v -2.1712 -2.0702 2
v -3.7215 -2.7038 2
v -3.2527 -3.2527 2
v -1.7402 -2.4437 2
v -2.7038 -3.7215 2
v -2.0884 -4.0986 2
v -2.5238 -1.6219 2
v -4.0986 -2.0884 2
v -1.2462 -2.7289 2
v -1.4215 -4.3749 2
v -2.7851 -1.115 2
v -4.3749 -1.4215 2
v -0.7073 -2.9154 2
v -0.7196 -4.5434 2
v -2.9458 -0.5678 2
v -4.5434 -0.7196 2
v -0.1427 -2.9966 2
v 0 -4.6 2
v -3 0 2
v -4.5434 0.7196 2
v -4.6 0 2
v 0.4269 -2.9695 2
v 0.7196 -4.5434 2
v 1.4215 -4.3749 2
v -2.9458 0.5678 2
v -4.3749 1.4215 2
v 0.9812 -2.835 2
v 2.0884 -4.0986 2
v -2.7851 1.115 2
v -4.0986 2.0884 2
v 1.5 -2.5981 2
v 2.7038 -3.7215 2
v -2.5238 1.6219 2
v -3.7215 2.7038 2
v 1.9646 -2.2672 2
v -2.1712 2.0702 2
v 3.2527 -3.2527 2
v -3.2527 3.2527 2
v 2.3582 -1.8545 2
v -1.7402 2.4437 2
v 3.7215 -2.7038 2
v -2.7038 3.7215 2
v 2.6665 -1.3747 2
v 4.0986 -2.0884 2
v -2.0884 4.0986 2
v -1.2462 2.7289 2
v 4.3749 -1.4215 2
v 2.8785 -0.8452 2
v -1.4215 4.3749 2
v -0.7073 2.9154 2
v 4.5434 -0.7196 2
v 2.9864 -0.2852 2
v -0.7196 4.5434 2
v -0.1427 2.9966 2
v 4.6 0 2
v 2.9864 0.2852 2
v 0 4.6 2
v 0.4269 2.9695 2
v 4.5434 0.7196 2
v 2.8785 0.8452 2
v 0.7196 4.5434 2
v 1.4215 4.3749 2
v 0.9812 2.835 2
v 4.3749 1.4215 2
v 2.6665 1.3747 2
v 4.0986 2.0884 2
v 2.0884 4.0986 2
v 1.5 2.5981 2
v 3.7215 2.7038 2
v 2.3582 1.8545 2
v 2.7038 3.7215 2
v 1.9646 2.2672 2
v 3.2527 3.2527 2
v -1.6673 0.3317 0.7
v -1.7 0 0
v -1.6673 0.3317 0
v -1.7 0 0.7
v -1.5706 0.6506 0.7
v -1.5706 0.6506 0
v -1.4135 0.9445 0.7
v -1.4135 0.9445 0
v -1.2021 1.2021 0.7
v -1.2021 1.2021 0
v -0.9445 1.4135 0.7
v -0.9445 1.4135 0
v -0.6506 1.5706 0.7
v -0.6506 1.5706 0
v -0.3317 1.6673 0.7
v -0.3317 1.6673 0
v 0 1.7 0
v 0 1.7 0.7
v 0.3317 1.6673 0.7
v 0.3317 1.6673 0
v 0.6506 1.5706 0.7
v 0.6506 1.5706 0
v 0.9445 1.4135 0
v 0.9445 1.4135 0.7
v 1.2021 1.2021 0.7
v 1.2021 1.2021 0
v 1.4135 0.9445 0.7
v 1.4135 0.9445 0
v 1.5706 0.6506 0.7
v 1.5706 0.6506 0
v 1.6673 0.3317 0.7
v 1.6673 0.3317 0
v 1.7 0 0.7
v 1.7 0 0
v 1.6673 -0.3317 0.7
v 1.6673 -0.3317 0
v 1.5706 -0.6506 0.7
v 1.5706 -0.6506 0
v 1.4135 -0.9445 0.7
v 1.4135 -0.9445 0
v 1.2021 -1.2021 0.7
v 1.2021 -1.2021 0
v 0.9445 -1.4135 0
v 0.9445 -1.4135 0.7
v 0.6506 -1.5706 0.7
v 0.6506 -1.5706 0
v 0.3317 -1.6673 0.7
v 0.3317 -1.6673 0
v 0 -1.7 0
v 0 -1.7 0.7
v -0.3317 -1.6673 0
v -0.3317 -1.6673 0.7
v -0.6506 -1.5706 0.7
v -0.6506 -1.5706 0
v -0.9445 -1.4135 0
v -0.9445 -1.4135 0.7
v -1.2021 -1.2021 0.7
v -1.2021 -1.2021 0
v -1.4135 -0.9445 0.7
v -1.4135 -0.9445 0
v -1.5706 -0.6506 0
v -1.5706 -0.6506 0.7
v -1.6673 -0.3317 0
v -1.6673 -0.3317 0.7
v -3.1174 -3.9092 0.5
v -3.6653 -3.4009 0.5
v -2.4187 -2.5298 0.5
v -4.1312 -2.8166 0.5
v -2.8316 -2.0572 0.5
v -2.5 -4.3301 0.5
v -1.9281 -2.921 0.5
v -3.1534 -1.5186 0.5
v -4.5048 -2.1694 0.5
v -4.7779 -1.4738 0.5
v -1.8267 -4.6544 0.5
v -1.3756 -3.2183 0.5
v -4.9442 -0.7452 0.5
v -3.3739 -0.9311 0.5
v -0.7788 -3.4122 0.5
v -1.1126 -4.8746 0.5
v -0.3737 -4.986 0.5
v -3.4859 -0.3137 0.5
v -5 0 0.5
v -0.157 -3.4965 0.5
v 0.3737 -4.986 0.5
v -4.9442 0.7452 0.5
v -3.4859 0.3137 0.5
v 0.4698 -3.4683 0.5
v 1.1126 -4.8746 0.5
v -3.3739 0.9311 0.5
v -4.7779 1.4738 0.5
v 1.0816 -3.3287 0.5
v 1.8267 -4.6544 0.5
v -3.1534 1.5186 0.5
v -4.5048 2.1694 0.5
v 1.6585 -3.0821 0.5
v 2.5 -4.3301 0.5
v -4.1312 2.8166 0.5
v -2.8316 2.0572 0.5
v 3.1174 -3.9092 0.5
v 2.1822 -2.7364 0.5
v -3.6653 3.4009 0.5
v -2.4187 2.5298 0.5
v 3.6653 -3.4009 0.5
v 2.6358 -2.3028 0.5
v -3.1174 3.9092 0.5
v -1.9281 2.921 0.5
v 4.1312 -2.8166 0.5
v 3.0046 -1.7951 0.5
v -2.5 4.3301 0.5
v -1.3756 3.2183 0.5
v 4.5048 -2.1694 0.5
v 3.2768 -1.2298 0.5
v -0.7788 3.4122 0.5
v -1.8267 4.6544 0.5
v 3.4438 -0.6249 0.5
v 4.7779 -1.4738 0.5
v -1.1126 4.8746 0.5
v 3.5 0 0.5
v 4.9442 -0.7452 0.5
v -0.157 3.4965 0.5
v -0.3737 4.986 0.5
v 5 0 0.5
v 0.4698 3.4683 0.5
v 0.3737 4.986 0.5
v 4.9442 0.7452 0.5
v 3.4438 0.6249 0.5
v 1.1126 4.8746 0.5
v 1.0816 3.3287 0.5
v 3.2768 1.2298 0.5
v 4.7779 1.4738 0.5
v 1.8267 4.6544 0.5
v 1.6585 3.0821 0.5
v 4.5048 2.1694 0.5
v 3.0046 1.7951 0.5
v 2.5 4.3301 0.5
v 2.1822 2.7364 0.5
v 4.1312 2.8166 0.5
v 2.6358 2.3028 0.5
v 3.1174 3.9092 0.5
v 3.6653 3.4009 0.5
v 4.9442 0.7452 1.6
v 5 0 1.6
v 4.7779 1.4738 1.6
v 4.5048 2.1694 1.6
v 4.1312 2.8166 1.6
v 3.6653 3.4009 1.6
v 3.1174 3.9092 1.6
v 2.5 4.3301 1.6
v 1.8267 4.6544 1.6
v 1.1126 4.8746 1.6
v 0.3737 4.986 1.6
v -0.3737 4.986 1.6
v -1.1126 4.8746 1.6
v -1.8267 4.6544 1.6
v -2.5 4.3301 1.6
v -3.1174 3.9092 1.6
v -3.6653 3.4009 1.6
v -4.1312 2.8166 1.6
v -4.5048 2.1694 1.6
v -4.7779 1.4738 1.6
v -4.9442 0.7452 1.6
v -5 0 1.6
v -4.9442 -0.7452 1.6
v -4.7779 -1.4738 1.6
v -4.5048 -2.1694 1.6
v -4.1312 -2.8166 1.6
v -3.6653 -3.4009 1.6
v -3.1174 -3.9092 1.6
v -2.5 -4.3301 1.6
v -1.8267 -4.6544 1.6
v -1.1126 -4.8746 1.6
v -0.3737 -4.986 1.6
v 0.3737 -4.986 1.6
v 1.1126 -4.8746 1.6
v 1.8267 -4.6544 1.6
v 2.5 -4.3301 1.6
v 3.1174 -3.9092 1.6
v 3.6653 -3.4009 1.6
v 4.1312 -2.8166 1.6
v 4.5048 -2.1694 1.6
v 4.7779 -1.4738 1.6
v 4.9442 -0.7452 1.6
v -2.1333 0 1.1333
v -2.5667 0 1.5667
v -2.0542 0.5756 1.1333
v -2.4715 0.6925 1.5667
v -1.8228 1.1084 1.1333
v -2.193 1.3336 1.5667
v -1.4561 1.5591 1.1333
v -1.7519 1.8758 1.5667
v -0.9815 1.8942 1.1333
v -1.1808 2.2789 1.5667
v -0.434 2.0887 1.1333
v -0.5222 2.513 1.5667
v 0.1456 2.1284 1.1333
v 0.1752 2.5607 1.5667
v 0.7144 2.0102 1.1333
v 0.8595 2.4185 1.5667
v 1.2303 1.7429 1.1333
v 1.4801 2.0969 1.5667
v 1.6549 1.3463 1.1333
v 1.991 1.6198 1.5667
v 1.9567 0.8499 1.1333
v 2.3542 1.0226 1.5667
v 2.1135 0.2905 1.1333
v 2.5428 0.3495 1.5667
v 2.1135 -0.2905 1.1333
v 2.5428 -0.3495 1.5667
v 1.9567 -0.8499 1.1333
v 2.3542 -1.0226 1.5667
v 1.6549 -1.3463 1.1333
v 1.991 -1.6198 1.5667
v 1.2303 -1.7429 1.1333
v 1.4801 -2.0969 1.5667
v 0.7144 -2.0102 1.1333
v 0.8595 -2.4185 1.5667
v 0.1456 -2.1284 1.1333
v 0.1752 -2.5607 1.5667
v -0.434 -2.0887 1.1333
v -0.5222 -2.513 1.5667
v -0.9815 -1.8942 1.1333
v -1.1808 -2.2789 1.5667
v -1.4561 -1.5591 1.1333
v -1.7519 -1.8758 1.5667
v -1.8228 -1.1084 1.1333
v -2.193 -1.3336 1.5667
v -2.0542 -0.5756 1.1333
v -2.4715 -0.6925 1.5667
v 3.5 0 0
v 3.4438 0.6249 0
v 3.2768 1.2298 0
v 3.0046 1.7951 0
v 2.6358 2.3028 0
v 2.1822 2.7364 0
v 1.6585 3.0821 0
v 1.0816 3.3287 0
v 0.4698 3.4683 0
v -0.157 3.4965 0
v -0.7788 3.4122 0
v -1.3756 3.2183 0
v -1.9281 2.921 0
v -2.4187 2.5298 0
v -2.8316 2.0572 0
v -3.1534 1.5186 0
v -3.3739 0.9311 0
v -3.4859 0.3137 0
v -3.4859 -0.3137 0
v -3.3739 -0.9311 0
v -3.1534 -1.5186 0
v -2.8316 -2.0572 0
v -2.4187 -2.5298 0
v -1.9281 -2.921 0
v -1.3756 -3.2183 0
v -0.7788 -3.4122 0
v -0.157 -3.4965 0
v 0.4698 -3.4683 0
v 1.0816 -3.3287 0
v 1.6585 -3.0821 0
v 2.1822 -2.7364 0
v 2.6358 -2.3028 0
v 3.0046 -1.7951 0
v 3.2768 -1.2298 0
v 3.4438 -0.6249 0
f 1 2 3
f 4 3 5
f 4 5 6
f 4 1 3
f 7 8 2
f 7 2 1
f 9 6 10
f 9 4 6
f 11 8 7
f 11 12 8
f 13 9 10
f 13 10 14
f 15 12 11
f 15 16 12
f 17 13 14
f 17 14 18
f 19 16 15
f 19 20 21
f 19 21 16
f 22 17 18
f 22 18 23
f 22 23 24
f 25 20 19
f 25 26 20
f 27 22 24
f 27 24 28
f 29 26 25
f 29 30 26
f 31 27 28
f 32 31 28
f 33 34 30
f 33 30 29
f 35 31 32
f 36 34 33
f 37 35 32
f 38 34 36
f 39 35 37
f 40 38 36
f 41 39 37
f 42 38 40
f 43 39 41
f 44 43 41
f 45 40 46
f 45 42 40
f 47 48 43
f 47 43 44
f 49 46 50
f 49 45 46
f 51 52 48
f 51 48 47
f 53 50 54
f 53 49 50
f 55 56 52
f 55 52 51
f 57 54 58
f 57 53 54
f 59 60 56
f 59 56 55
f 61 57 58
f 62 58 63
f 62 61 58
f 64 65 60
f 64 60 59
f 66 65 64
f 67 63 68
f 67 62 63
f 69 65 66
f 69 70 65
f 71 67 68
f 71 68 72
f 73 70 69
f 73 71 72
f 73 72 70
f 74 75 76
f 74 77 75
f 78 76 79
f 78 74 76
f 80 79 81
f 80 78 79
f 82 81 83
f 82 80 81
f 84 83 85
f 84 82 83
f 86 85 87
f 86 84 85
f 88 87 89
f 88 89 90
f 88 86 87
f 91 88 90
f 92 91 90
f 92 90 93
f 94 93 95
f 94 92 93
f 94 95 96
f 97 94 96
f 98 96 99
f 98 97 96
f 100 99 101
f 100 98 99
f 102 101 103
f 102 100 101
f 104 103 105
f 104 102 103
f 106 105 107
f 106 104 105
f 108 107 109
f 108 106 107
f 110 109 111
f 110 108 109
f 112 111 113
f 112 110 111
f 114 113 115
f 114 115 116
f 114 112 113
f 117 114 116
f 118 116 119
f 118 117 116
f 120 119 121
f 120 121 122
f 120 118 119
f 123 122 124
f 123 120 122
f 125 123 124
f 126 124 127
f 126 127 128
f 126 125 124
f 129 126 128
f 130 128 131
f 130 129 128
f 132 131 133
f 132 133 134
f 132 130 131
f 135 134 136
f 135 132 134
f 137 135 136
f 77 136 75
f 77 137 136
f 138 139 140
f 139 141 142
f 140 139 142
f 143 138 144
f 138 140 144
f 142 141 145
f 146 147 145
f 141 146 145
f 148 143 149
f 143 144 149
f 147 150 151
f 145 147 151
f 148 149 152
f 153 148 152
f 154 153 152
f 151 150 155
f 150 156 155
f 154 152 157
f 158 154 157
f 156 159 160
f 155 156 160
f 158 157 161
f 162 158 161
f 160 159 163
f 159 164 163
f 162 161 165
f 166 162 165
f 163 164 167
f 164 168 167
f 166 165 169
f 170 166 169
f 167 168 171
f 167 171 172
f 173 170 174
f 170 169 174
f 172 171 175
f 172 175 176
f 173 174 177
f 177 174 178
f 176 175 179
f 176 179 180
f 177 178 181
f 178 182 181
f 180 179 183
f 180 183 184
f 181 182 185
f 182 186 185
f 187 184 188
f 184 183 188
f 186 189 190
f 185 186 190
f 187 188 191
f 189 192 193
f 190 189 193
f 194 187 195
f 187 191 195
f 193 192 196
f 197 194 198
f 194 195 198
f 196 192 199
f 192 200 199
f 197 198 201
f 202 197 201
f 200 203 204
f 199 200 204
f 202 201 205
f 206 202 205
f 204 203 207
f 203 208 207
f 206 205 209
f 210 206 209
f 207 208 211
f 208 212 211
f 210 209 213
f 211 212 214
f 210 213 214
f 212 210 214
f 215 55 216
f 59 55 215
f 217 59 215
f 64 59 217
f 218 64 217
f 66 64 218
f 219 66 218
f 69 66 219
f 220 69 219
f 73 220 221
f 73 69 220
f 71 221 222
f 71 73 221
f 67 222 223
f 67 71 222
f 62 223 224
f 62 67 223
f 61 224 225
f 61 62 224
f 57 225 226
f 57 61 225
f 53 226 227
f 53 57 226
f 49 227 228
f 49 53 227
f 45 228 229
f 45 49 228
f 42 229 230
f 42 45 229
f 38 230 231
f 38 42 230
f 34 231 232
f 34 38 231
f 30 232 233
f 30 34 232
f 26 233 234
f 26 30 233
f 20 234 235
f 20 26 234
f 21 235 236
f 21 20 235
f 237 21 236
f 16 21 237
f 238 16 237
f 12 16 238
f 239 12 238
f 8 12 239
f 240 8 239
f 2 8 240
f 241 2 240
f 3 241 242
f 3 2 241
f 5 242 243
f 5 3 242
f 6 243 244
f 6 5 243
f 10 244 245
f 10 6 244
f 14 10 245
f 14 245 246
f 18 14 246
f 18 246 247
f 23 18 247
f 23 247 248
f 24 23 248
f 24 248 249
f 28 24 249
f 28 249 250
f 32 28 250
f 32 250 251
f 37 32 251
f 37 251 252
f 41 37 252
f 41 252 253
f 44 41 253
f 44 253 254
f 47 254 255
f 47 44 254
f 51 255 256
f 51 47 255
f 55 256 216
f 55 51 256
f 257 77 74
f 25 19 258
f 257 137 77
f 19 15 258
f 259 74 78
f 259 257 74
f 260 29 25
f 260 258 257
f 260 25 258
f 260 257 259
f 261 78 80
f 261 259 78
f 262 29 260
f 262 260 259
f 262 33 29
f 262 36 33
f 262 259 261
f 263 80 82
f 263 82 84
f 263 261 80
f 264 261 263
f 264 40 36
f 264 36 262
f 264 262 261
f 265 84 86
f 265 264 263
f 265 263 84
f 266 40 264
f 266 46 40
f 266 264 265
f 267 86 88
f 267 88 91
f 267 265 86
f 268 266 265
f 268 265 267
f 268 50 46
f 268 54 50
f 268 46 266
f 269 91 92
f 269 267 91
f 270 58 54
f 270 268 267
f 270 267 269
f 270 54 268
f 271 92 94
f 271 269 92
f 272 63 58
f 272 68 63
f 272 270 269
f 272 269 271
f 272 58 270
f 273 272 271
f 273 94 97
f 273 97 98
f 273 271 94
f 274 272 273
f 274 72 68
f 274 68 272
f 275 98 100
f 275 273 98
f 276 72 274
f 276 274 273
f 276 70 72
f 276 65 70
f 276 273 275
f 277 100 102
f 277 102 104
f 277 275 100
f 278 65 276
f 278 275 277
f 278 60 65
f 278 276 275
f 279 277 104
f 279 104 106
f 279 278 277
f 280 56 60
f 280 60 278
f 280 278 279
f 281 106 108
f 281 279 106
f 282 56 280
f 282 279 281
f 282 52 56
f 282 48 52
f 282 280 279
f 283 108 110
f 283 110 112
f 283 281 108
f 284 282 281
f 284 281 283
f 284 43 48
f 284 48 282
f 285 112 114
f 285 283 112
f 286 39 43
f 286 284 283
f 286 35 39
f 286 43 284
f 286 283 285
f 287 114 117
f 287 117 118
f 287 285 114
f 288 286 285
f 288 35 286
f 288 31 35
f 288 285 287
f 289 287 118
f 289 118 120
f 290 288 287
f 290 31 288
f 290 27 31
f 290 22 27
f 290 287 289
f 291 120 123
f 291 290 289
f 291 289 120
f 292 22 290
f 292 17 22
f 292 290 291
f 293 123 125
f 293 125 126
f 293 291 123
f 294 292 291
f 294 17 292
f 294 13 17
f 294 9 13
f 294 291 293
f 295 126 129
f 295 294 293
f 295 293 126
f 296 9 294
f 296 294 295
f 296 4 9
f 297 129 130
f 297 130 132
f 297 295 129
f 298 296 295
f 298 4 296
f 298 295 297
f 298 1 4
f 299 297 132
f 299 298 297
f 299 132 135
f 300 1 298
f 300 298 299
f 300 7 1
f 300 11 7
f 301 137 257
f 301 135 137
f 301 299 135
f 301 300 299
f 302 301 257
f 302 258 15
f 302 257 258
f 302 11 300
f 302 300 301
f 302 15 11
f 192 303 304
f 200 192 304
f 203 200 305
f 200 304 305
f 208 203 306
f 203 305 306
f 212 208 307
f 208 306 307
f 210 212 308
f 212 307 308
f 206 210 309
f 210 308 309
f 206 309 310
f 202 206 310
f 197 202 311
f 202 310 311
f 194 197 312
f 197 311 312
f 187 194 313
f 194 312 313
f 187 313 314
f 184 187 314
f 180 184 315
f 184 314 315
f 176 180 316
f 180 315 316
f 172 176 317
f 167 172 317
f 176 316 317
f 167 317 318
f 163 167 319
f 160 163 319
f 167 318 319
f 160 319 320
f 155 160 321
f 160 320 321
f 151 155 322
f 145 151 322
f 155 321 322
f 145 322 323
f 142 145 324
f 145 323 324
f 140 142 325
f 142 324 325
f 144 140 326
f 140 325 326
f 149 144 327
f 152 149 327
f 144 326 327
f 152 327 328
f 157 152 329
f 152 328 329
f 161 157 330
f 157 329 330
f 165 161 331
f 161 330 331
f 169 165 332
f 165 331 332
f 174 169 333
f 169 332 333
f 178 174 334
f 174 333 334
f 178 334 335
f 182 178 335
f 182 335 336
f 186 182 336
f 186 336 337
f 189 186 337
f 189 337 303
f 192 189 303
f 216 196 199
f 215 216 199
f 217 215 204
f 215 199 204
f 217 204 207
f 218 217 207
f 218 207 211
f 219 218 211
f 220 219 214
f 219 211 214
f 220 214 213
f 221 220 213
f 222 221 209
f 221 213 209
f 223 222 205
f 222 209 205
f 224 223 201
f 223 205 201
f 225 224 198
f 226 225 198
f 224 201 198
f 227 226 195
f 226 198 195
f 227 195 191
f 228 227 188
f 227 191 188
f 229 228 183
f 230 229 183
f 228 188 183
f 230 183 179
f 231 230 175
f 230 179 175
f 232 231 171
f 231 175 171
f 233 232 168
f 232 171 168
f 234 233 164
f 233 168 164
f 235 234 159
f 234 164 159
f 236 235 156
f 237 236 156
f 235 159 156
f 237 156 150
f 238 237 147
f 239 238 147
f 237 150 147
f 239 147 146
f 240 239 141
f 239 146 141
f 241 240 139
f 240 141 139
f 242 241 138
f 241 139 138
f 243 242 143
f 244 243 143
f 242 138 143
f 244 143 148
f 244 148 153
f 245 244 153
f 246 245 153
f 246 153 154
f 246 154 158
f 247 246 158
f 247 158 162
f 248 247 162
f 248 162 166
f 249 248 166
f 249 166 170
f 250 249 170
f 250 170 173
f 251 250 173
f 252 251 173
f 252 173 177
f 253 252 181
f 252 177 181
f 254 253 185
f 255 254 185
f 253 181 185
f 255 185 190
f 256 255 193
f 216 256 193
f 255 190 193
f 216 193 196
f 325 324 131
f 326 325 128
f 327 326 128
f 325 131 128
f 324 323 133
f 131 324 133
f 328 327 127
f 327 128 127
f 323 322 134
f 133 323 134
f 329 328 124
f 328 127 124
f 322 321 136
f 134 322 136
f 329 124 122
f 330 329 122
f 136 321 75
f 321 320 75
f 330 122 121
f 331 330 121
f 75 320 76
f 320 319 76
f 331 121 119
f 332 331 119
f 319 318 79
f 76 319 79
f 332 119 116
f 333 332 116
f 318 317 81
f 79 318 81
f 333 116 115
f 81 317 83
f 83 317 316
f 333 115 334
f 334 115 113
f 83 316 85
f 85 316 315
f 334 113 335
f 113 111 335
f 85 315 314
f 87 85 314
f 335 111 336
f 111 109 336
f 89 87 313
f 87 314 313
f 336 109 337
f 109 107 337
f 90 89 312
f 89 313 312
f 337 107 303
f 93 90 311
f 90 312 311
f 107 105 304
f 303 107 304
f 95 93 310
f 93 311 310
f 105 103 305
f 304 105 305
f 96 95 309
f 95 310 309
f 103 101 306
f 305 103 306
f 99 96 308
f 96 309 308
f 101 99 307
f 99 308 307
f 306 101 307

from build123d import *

# Parameters (mm, degrees)
SKETCH2_R           = 3.5
BOSS_EXTRUDE1_DEPTH = 0.5
SKETCH3_R           = 5
BOSS_EXTRUDE2_DEPTH = 1.5
CHAMFER1_SIZE       = 0.4


with BuildPart() as part:
    # Sketch2 → Boss-Extrude1 (new body)
    with BuildSketch(Plane.XY):
        Circle(SKETCH2_R)
    extrude(amount=BOSS_EXTRUDE1_DEPTH)

    # Sketch3 → Boss-Extrude2 (add)
    with BuildSketch(Plane.XY.offset(0.5)):
        Circle(SKETCH3_R)
    extrude(amount=BOSS_EXTRUDE2_DEPTH)

    # Chamfer1
    chamfer1_edges = [part.edges().sort_by_distance(p)[0] for p in [
        (-5, 0, 2),
    ]]
    chamfer(chamfer1_edges, length=CHAMFER1_SIZE)

    # Sketch4 → Cut-Revolve1 (revolve, cut)
    with BuildSketch(Plane(origin=(0, 0, 0), x_dir=(0, -1, 0), z_dir=(1, 0, 0)), mode=Mode.PRIVATE) as cut_revolve1_sk:
        Polygon((3, -2), (0, -2), (0, 0), (1.7, 0), (1.7, -0.7), align=None)
    revolve(cut_revolve1_sk.sketch.rotate(Axis((0, 0, 2), (0, 0, -1)), 90), axis=Axis((0, 0, 2), (0, 0, -1)), mode=Mode.SUBTRACT)


solid = part.part
